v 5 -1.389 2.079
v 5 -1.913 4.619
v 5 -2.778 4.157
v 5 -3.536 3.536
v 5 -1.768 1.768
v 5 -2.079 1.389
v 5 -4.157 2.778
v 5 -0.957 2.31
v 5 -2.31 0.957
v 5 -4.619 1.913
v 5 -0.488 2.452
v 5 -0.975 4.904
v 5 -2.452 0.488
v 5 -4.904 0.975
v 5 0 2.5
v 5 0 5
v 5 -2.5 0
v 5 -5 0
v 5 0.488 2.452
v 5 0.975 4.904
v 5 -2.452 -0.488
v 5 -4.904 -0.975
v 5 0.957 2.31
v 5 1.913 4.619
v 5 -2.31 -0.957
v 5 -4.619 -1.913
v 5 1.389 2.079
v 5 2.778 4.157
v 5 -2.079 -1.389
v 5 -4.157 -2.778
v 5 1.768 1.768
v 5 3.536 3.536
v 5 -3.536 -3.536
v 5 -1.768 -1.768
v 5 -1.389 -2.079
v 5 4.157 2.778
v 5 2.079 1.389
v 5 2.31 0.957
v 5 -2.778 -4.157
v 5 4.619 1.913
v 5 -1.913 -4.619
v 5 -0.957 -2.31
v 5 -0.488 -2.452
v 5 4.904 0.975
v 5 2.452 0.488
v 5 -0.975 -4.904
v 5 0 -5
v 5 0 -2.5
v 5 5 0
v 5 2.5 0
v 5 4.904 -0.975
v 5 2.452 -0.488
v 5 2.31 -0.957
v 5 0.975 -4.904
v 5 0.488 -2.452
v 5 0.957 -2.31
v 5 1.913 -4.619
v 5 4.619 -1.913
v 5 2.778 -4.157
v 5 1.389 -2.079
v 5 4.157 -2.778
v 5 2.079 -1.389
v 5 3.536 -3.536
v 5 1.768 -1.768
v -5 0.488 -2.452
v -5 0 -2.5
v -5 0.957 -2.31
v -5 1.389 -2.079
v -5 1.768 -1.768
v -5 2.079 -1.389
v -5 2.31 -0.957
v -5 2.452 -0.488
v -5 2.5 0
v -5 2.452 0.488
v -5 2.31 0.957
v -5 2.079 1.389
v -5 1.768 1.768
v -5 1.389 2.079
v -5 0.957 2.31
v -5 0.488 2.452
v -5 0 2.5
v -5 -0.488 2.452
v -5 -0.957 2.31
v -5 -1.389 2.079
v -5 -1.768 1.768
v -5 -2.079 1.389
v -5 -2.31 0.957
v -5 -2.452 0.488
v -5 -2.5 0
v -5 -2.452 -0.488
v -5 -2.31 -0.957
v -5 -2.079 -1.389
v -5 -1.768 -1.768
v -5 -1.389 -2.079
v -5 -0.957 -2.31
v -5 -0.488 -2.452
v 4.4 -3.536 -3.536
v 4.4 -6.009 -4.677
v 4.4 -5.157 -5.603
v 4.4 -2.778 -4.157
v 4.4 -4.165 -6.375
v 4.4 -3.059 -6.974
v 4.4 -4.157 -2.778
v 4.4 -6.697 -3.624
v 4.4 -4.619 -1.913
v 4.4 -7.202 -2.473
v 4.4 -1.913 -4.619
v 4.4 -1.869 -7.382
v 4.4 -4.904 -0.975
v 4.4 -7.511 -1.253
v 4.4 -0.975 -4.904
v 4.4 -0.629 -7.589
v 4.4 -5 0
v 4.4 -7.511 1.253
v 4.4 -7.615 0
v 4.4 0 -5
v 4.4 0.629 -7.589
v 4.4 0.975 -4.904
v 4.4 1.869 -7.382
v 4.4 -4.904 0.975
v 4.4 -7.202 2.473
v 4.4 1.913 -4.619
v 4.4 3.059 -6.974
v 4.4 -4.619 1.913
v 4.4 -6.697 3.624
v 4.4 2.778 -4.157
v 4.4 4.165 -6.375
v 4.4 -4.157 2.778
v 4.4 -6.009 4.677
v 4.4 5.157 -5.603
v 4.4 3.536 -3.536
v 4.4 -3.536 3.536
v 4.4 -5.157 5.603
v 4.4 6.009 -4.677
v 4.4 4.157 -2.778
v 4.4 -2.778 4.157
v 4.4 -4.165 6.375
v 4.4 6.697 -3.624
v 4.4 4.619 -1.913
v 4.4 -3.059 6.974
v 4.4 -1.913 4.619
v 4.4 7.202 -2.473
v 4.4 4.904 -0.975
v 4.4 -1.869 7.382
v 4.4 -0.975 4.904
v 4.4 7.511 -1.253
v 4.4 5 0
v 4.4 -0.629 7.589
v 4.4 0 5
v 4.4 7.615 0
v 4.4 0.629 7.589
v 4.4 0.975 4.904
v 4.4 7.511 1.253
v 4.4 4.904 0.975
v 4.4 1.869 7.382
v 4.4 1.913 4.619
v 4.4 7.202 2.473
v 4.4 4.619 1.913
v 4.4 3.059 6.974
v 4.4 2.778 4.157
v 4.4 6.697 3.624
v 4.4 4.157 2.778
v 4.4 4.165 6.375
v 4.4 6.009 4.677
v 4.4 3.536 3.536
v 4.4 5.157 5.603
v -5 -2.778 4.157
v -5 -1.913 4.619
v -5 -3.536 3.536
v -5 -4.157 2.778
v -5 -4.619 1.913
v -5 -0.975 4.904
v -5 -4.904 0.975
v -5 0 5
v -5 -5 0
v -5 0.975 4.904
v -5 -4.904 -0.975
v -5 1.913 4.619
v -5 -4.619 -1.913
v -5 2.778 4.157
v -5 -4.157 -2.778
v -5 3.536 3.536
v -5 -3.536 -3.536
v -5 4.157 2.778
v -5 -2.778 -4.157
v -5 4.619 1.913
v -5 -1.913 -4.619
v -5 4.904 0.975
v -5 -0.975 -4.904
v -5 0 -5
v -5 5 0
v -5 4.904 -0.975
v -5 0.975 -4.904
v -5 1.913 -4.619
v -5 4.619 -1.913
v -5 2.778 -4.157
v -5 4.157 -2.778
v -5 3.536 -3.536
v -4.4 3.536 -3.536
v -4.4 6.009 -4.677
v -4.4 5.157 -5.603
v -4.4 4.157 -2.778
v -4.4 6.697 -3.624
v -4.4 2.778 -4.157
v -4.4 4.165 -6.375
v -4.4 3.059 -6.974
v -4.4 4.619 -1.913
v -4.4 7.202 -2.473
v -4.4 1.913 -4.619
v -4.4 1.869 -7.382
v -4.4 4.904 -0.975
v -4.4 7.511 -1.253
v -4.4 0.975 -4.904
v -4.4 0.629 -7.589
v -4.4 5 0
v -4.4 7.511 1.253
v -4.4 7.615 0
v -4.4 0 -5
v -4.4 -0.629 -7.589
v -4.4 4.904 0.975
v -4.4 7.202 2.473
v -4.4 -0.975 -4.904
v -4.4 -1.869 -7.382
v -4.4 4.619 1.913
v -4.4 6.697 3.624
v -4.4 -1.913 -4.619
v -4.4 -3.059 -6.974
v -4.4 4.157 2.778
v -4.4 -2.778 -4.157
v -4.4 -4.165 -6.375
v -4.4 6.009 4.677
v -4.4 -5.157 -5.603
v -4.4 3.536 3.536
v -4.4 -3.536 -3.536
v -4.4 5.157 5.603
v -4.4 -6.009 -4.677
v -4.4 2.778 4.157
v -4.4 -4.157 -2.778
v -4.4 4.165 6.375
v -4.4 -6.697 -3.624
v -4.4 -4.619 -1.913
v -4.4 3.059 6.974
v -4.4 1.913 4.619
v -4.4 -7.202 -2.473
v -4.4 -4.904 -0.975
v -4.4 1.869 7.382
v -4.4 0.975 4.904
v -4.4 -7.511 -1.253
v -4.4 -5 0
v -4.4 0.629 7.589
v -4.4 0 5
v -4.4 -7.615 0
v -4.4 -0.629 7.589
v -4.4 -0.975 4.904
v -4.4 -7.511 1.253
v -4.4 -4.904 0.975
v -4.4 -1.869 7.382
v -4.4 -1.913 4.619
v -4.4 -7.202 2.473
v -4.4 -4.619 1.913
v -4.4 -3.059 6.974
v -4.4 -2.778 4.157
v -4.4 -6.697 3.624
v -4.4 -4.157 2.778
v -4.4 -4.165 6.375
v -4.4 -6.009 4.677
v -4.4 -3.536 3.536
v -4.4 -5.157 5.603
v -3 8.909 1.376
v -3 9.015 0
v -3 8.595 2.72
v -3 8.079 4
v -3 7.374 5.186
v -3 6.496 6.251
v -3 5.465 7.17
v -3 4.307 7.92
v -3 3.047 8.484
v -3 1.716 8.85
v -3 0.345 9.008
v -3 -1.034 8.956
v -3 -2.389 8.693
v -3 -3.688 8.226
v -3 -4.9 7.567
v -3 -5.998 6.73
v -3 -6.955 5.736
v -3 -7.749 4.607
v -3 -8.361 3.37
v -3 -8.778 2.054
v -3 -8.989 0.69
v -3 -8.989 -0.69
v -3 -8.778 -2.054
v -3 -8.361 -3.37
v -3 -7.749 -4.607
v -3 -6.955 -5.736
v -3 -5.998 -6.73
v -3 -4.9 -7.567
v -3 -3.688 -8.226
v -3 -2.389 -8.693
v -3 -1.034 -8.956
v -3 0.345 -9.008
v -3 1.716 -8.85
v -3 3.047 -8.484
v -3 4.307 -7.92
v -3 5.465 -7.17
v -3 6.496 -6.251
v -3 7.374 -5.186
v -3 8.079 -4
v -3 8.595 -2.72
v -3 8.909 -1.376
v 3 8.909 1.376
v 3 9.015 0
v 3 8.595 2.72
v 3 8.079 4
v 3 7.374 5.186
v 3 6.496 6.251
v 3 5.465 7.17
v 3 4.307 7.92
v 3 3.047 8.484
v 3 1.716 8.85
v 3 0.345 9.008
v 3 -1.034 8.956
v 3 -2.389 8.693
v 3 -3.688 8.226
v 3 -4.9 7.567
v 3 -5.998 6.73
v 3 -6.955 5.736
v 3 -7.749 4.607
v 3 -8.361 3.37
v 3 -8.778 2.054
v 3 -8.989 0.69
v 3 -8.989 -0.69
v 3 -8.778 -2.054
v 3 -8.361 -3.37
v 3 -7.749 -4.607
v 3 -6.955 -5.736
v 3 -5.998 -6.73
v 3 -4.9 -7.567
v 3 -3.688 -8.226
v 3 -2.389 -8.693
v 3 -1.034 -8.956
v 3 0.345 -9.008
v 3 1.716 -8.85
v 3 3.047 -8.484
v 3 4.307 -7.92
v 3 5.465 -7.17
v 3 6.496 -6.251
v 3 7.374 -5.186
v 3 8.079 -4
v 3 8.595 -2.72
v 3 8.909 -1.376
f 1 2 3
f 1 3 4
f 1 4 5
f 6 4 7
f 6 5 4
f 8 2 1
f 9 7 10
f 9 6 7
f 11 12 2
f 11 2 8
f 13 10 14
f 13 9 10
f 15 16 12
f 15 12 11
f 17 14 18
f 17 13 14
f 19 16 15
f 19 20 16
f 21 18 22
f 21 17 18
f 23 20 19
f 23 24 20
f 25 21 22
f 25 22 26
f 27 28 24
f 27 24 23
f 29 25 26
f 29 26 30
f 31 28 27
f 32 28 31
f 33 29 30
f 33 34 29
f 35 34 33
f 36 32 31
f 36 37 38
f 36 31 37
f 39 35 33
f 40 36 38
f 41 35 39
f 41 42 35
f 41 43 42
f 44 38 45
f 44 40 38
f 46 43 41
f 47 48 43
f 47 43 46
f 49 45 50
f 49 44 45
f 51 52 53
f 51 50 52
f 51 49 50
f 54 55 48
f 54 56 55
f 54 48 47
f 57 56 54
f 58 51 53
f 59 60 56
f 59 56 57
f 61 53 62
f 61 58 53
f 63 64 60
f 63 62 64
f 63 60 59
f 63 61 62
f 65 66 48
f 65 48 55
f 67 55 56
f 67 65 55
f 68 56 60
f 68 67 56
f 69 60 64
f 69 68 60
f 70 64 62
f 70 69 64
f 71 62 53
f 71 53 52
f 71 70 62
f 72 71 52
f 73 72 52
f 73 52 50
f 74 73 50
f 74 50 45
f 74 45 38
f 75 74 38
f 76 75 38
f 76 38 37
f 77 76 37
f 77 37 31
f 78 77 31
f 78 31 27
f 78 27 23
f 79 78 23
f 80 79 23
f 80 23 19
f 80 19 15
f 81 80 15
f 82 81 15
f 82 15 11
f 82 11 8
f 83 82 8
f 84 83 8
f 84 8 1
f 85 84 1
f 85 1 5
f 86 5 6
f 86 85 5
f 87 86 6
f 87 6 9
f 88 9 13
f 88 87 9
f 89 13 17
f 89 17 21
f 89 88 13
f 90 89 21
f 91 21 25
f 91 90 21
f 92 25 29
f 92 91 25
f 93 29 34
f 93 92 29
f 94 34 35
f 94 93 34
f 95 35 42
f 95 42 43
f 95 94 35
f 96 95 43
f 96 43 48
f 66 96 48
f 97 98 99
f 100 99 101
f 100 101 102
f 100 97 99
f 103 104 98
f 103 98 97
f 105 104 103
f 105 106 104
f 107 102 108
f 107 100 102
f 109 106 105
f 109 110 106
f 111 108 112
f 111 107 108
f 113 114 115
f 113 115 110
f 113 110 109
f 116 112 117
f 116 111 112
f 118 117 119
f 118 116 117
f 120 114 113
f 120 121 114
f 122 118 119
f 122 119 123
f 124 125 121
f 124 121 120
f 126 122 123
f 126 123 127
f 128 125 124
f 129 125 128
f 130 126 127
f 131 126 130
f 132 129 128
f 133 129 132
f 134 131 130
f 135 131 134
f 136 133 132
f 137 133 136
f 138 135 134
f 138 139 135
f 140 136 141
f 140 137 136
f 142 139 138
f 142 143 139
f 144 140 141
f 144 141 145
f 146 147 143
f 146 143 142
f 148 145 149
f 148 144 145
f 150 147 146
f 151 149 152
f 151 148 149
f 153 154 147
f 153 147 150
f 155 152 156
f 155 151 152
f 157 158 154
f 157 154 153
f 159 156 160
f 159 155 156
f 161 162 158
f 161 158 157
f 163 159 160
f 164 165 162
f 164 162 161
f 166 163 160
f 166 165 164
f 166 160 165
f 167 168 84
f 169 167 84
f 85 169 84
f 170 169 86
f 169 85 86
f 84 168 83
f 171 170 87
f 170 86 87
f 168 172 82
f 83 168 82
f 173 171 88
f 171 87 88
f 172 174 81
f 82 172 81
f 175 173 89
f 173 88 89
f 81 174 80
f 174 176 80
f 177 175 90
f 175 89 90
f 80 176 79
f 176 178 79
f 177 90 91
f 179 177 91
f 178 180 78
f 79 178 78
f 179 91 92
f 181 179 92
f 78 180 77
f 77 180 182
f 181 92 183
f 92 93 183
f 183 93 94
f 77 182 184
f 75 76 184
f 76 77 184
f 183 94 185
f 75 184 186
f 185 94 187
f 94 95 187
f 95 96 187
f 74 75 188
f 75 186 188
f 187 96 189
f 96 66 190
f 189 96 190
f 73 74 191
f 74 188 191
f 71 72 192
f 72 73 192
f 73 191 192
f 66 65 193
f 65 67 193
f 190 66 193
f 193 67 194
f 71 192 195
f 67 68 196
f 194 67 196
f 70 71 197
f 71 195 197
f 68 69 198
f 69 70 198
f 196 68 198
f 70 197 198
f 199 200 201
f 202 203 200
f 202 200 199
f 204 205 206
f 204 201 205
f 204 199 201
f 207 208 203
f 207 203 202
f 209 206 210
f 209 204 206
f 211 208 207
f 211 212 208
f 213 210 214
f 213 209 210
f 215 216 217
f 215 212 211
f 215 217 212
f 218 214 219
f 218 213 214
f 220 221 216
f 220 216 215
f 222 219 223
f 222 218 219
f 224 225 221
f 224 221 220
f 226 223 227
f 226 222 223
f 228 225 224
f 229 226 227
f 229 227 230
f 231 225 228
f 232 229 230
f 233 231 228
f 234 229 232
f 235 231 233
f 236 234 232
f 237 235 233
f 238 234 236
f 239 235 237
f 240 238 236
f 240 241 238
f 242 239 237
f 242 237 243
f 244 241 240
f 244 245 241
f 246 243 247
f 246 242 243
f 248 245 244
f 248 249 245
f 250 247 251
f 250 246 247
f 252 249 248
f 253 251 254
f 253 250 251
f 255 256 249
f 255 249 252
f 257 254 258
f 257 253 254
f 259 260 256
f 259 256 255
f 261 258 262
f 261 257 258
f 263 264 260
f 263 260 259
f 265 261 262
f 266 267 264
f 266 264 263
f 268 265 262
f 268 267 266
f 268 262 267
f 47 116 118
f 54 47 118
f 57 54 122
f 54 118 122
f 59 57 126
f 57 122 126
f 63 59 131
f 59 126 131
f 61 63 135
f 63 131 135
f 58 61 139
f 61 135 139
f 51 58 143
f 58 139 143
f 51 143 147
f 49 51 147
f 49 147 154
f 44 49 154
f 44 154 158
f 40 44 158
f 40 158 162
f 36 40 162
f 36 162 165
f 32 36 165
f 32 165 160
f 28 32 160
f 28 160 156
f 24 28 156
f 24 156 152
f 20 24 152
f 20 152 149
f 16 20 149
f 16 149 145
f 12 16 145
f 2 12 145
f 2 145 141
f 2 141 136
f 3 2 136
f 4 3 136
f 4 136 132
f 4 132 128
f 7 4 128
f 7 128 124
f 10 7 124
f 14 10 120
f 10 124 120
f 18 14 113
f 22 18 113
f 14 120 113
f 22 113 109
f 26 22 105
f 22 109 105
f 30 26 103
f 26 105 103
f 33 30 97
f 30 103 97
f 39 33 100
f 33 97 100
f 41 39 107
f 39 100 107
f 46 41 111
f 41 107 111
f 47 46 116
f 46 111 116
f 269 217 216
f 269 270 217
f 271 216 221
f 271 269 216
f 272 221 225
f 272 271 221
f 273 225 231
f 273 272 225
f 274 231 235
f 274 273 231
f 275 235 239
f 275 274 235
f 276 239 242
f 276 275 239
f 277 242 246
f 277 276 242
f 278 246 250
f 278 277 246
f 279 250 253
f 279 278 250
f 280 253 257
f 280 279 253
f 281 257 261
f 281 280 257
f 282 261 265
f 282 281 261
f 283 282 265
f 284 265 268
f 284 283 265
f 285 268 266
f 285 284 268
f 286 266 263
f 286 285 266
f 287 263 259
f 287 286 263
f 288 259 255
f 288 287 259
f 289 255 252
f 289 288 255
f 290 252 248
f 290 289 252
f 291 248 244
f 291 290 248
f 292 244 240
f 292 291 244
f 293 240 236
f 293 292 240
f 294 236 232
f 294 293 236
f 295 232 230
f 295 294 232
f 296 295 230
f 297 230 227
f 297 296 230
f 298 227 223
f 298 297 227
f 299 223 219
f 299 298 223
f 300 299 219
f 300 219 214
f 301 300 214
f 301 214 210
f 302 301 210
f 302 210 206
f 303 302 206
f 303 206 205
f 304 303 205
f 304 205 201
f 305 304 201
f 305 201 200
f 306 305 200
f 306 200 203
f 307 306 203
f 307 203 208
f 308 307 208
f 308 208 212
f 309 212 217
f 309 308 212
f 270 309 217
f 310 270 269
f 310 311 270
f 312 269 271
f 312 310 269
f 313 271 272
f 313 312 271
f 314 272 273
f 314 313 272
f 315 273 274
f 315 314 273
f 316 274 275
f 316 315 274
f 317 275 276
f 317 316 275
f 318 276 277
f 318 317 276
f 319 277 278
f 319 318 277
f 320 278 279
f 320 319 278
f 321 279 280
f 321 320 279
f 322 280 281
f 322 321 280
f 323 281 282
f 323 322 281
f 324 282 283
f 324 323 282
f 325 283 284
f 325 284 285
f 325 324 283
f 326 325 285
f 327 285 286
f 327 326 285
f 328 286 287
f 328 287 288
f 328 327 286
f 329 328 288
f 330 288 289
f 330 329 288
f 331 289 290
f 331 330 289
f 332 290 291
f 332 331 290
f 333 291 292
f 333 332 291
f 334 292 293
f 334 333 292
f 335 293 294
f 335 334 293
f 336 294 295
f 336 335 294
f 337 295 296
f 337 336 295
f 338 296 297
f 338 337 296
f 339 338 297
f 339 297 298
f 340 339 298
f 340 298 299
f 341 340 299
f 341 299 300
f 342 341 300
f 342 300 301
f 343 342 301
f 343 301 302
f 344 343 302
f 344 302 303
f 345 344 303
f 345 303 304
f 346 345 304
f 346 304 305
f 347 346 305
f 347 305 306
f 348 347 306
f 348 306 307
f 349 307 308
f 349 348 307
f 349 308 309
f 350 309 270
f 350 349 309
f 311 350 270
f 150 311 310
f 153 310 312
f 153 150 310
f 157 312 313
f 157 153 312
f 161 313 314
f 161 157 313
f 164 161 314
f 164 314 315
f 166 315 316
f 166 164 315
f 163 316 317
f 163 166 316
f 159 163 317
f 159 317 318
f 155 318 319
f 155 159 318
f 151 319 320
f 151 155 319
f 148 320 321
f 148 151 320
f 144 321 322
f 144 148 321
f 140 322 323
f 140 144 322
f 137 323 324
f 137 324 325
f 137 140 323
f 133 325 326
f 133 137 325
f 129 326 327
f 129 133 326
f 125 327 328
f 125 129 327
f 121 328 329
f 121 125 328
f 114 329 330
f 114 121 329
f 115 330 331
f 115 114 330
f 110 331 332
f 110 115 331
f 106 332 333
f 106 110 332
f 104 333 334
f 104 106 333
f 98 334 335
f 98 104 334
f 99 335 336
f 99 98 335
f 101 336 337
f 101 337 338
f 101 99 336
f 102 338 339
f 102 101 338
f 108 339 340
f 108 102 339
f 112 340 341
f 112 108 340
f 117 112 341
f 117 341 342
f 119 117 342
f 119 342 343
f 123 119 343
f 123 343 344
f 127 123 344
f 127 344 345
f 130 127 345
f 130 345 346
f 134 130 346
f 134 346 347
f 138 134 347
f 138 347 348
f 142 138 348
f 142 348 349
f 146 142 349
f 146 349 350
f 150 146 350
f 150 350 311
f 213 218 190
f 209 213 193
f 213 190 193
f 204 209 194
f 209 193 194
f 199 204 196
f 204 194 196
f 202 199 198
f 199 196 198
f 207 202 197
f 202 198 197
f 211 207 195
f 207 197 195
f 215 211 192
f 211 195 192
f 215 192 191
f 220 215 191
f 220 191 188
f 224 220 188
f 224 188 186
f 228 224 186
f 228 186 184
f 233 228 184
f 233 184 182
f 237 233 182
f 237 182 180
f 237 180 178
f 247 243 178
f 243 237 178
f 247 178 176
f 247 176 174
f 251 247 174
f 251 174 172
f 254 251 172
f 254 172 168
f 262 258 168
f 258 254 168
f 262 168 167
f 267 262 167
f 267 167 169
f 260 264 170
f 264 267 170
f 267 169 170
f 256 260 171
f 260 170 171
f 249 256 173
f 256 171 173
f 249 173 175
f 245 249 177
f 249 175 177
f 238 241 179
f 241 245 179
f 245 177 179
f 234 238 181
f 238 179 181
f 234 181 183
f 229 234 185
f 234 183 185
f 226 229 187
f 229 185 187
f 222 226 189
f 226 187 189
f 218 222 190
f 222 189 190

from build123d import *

# Parameters (mm, degrees)
CYLINDER003_R     = 2.5
CYLINDER003_DEPTH = 10
CYLINDER_R        = 5
CYLINDER_DEPTH    = 10
CYLINDER002_R     = 2.5
CYLINDER002_DEPTH = 10


with BuildPart() as cylinder003:
    # Cylinder003 → Cylinder003 (new body)
    with BuildSketch(Plane(origin=(-5, 0, 0), x_dir=(0, 0, -1), z_dir=(1, 0, 0))):
        Circle(CYLINDER003_R)
    extrude(amount=CYLINDER003_DEPTH)


with BuildPart() as cut001:
    # Cylinder → Cylinder (new body)
    with BuildSketch(Plane(origin=(-5, 0, 0), x_dir=(0, 0, -1), z_dir=(1, 0, 0))):
        Circle(CYLINDER_R)
    extrude(amount=CYLINDER_DEPTH)

    # Cut001: cut Cylinder003
    add(cylinder003.part, mode=Mode.SUBTRACT)


with BuildPart() as cylinder002:
    # Cylinder002 → Cylinder002 (new body)
    with BuildSketch(Plane(origin=(-5, 0, 0), x_dir=(0, 0, -1), z_dir=(1, 0, 0))):
        Circle(CYLINDER002_R)
    extrude(amount=CYLINDER002_DEPTH)


with BuildPart() as fusion:
    # Sketch → Revolve (revolve)
    with BuildSketch(Plane.XY):
        Polygon((-4.4, 0), (-4.4, 7.615), (-3, 9.015), (3, 9.015), (4.4, 7.615), (4.4, 0), (0, 0), align=None)
    revolve(axis=Axis((0, 0, 0), (1, 0, 0)))

    # Cut: cut Cylinder002
    add(cylinder002.part, mode=Mode.SUBTRACT)

    # Fusion: union Cut001
    add(cut001.part)


solid = fusion.part
